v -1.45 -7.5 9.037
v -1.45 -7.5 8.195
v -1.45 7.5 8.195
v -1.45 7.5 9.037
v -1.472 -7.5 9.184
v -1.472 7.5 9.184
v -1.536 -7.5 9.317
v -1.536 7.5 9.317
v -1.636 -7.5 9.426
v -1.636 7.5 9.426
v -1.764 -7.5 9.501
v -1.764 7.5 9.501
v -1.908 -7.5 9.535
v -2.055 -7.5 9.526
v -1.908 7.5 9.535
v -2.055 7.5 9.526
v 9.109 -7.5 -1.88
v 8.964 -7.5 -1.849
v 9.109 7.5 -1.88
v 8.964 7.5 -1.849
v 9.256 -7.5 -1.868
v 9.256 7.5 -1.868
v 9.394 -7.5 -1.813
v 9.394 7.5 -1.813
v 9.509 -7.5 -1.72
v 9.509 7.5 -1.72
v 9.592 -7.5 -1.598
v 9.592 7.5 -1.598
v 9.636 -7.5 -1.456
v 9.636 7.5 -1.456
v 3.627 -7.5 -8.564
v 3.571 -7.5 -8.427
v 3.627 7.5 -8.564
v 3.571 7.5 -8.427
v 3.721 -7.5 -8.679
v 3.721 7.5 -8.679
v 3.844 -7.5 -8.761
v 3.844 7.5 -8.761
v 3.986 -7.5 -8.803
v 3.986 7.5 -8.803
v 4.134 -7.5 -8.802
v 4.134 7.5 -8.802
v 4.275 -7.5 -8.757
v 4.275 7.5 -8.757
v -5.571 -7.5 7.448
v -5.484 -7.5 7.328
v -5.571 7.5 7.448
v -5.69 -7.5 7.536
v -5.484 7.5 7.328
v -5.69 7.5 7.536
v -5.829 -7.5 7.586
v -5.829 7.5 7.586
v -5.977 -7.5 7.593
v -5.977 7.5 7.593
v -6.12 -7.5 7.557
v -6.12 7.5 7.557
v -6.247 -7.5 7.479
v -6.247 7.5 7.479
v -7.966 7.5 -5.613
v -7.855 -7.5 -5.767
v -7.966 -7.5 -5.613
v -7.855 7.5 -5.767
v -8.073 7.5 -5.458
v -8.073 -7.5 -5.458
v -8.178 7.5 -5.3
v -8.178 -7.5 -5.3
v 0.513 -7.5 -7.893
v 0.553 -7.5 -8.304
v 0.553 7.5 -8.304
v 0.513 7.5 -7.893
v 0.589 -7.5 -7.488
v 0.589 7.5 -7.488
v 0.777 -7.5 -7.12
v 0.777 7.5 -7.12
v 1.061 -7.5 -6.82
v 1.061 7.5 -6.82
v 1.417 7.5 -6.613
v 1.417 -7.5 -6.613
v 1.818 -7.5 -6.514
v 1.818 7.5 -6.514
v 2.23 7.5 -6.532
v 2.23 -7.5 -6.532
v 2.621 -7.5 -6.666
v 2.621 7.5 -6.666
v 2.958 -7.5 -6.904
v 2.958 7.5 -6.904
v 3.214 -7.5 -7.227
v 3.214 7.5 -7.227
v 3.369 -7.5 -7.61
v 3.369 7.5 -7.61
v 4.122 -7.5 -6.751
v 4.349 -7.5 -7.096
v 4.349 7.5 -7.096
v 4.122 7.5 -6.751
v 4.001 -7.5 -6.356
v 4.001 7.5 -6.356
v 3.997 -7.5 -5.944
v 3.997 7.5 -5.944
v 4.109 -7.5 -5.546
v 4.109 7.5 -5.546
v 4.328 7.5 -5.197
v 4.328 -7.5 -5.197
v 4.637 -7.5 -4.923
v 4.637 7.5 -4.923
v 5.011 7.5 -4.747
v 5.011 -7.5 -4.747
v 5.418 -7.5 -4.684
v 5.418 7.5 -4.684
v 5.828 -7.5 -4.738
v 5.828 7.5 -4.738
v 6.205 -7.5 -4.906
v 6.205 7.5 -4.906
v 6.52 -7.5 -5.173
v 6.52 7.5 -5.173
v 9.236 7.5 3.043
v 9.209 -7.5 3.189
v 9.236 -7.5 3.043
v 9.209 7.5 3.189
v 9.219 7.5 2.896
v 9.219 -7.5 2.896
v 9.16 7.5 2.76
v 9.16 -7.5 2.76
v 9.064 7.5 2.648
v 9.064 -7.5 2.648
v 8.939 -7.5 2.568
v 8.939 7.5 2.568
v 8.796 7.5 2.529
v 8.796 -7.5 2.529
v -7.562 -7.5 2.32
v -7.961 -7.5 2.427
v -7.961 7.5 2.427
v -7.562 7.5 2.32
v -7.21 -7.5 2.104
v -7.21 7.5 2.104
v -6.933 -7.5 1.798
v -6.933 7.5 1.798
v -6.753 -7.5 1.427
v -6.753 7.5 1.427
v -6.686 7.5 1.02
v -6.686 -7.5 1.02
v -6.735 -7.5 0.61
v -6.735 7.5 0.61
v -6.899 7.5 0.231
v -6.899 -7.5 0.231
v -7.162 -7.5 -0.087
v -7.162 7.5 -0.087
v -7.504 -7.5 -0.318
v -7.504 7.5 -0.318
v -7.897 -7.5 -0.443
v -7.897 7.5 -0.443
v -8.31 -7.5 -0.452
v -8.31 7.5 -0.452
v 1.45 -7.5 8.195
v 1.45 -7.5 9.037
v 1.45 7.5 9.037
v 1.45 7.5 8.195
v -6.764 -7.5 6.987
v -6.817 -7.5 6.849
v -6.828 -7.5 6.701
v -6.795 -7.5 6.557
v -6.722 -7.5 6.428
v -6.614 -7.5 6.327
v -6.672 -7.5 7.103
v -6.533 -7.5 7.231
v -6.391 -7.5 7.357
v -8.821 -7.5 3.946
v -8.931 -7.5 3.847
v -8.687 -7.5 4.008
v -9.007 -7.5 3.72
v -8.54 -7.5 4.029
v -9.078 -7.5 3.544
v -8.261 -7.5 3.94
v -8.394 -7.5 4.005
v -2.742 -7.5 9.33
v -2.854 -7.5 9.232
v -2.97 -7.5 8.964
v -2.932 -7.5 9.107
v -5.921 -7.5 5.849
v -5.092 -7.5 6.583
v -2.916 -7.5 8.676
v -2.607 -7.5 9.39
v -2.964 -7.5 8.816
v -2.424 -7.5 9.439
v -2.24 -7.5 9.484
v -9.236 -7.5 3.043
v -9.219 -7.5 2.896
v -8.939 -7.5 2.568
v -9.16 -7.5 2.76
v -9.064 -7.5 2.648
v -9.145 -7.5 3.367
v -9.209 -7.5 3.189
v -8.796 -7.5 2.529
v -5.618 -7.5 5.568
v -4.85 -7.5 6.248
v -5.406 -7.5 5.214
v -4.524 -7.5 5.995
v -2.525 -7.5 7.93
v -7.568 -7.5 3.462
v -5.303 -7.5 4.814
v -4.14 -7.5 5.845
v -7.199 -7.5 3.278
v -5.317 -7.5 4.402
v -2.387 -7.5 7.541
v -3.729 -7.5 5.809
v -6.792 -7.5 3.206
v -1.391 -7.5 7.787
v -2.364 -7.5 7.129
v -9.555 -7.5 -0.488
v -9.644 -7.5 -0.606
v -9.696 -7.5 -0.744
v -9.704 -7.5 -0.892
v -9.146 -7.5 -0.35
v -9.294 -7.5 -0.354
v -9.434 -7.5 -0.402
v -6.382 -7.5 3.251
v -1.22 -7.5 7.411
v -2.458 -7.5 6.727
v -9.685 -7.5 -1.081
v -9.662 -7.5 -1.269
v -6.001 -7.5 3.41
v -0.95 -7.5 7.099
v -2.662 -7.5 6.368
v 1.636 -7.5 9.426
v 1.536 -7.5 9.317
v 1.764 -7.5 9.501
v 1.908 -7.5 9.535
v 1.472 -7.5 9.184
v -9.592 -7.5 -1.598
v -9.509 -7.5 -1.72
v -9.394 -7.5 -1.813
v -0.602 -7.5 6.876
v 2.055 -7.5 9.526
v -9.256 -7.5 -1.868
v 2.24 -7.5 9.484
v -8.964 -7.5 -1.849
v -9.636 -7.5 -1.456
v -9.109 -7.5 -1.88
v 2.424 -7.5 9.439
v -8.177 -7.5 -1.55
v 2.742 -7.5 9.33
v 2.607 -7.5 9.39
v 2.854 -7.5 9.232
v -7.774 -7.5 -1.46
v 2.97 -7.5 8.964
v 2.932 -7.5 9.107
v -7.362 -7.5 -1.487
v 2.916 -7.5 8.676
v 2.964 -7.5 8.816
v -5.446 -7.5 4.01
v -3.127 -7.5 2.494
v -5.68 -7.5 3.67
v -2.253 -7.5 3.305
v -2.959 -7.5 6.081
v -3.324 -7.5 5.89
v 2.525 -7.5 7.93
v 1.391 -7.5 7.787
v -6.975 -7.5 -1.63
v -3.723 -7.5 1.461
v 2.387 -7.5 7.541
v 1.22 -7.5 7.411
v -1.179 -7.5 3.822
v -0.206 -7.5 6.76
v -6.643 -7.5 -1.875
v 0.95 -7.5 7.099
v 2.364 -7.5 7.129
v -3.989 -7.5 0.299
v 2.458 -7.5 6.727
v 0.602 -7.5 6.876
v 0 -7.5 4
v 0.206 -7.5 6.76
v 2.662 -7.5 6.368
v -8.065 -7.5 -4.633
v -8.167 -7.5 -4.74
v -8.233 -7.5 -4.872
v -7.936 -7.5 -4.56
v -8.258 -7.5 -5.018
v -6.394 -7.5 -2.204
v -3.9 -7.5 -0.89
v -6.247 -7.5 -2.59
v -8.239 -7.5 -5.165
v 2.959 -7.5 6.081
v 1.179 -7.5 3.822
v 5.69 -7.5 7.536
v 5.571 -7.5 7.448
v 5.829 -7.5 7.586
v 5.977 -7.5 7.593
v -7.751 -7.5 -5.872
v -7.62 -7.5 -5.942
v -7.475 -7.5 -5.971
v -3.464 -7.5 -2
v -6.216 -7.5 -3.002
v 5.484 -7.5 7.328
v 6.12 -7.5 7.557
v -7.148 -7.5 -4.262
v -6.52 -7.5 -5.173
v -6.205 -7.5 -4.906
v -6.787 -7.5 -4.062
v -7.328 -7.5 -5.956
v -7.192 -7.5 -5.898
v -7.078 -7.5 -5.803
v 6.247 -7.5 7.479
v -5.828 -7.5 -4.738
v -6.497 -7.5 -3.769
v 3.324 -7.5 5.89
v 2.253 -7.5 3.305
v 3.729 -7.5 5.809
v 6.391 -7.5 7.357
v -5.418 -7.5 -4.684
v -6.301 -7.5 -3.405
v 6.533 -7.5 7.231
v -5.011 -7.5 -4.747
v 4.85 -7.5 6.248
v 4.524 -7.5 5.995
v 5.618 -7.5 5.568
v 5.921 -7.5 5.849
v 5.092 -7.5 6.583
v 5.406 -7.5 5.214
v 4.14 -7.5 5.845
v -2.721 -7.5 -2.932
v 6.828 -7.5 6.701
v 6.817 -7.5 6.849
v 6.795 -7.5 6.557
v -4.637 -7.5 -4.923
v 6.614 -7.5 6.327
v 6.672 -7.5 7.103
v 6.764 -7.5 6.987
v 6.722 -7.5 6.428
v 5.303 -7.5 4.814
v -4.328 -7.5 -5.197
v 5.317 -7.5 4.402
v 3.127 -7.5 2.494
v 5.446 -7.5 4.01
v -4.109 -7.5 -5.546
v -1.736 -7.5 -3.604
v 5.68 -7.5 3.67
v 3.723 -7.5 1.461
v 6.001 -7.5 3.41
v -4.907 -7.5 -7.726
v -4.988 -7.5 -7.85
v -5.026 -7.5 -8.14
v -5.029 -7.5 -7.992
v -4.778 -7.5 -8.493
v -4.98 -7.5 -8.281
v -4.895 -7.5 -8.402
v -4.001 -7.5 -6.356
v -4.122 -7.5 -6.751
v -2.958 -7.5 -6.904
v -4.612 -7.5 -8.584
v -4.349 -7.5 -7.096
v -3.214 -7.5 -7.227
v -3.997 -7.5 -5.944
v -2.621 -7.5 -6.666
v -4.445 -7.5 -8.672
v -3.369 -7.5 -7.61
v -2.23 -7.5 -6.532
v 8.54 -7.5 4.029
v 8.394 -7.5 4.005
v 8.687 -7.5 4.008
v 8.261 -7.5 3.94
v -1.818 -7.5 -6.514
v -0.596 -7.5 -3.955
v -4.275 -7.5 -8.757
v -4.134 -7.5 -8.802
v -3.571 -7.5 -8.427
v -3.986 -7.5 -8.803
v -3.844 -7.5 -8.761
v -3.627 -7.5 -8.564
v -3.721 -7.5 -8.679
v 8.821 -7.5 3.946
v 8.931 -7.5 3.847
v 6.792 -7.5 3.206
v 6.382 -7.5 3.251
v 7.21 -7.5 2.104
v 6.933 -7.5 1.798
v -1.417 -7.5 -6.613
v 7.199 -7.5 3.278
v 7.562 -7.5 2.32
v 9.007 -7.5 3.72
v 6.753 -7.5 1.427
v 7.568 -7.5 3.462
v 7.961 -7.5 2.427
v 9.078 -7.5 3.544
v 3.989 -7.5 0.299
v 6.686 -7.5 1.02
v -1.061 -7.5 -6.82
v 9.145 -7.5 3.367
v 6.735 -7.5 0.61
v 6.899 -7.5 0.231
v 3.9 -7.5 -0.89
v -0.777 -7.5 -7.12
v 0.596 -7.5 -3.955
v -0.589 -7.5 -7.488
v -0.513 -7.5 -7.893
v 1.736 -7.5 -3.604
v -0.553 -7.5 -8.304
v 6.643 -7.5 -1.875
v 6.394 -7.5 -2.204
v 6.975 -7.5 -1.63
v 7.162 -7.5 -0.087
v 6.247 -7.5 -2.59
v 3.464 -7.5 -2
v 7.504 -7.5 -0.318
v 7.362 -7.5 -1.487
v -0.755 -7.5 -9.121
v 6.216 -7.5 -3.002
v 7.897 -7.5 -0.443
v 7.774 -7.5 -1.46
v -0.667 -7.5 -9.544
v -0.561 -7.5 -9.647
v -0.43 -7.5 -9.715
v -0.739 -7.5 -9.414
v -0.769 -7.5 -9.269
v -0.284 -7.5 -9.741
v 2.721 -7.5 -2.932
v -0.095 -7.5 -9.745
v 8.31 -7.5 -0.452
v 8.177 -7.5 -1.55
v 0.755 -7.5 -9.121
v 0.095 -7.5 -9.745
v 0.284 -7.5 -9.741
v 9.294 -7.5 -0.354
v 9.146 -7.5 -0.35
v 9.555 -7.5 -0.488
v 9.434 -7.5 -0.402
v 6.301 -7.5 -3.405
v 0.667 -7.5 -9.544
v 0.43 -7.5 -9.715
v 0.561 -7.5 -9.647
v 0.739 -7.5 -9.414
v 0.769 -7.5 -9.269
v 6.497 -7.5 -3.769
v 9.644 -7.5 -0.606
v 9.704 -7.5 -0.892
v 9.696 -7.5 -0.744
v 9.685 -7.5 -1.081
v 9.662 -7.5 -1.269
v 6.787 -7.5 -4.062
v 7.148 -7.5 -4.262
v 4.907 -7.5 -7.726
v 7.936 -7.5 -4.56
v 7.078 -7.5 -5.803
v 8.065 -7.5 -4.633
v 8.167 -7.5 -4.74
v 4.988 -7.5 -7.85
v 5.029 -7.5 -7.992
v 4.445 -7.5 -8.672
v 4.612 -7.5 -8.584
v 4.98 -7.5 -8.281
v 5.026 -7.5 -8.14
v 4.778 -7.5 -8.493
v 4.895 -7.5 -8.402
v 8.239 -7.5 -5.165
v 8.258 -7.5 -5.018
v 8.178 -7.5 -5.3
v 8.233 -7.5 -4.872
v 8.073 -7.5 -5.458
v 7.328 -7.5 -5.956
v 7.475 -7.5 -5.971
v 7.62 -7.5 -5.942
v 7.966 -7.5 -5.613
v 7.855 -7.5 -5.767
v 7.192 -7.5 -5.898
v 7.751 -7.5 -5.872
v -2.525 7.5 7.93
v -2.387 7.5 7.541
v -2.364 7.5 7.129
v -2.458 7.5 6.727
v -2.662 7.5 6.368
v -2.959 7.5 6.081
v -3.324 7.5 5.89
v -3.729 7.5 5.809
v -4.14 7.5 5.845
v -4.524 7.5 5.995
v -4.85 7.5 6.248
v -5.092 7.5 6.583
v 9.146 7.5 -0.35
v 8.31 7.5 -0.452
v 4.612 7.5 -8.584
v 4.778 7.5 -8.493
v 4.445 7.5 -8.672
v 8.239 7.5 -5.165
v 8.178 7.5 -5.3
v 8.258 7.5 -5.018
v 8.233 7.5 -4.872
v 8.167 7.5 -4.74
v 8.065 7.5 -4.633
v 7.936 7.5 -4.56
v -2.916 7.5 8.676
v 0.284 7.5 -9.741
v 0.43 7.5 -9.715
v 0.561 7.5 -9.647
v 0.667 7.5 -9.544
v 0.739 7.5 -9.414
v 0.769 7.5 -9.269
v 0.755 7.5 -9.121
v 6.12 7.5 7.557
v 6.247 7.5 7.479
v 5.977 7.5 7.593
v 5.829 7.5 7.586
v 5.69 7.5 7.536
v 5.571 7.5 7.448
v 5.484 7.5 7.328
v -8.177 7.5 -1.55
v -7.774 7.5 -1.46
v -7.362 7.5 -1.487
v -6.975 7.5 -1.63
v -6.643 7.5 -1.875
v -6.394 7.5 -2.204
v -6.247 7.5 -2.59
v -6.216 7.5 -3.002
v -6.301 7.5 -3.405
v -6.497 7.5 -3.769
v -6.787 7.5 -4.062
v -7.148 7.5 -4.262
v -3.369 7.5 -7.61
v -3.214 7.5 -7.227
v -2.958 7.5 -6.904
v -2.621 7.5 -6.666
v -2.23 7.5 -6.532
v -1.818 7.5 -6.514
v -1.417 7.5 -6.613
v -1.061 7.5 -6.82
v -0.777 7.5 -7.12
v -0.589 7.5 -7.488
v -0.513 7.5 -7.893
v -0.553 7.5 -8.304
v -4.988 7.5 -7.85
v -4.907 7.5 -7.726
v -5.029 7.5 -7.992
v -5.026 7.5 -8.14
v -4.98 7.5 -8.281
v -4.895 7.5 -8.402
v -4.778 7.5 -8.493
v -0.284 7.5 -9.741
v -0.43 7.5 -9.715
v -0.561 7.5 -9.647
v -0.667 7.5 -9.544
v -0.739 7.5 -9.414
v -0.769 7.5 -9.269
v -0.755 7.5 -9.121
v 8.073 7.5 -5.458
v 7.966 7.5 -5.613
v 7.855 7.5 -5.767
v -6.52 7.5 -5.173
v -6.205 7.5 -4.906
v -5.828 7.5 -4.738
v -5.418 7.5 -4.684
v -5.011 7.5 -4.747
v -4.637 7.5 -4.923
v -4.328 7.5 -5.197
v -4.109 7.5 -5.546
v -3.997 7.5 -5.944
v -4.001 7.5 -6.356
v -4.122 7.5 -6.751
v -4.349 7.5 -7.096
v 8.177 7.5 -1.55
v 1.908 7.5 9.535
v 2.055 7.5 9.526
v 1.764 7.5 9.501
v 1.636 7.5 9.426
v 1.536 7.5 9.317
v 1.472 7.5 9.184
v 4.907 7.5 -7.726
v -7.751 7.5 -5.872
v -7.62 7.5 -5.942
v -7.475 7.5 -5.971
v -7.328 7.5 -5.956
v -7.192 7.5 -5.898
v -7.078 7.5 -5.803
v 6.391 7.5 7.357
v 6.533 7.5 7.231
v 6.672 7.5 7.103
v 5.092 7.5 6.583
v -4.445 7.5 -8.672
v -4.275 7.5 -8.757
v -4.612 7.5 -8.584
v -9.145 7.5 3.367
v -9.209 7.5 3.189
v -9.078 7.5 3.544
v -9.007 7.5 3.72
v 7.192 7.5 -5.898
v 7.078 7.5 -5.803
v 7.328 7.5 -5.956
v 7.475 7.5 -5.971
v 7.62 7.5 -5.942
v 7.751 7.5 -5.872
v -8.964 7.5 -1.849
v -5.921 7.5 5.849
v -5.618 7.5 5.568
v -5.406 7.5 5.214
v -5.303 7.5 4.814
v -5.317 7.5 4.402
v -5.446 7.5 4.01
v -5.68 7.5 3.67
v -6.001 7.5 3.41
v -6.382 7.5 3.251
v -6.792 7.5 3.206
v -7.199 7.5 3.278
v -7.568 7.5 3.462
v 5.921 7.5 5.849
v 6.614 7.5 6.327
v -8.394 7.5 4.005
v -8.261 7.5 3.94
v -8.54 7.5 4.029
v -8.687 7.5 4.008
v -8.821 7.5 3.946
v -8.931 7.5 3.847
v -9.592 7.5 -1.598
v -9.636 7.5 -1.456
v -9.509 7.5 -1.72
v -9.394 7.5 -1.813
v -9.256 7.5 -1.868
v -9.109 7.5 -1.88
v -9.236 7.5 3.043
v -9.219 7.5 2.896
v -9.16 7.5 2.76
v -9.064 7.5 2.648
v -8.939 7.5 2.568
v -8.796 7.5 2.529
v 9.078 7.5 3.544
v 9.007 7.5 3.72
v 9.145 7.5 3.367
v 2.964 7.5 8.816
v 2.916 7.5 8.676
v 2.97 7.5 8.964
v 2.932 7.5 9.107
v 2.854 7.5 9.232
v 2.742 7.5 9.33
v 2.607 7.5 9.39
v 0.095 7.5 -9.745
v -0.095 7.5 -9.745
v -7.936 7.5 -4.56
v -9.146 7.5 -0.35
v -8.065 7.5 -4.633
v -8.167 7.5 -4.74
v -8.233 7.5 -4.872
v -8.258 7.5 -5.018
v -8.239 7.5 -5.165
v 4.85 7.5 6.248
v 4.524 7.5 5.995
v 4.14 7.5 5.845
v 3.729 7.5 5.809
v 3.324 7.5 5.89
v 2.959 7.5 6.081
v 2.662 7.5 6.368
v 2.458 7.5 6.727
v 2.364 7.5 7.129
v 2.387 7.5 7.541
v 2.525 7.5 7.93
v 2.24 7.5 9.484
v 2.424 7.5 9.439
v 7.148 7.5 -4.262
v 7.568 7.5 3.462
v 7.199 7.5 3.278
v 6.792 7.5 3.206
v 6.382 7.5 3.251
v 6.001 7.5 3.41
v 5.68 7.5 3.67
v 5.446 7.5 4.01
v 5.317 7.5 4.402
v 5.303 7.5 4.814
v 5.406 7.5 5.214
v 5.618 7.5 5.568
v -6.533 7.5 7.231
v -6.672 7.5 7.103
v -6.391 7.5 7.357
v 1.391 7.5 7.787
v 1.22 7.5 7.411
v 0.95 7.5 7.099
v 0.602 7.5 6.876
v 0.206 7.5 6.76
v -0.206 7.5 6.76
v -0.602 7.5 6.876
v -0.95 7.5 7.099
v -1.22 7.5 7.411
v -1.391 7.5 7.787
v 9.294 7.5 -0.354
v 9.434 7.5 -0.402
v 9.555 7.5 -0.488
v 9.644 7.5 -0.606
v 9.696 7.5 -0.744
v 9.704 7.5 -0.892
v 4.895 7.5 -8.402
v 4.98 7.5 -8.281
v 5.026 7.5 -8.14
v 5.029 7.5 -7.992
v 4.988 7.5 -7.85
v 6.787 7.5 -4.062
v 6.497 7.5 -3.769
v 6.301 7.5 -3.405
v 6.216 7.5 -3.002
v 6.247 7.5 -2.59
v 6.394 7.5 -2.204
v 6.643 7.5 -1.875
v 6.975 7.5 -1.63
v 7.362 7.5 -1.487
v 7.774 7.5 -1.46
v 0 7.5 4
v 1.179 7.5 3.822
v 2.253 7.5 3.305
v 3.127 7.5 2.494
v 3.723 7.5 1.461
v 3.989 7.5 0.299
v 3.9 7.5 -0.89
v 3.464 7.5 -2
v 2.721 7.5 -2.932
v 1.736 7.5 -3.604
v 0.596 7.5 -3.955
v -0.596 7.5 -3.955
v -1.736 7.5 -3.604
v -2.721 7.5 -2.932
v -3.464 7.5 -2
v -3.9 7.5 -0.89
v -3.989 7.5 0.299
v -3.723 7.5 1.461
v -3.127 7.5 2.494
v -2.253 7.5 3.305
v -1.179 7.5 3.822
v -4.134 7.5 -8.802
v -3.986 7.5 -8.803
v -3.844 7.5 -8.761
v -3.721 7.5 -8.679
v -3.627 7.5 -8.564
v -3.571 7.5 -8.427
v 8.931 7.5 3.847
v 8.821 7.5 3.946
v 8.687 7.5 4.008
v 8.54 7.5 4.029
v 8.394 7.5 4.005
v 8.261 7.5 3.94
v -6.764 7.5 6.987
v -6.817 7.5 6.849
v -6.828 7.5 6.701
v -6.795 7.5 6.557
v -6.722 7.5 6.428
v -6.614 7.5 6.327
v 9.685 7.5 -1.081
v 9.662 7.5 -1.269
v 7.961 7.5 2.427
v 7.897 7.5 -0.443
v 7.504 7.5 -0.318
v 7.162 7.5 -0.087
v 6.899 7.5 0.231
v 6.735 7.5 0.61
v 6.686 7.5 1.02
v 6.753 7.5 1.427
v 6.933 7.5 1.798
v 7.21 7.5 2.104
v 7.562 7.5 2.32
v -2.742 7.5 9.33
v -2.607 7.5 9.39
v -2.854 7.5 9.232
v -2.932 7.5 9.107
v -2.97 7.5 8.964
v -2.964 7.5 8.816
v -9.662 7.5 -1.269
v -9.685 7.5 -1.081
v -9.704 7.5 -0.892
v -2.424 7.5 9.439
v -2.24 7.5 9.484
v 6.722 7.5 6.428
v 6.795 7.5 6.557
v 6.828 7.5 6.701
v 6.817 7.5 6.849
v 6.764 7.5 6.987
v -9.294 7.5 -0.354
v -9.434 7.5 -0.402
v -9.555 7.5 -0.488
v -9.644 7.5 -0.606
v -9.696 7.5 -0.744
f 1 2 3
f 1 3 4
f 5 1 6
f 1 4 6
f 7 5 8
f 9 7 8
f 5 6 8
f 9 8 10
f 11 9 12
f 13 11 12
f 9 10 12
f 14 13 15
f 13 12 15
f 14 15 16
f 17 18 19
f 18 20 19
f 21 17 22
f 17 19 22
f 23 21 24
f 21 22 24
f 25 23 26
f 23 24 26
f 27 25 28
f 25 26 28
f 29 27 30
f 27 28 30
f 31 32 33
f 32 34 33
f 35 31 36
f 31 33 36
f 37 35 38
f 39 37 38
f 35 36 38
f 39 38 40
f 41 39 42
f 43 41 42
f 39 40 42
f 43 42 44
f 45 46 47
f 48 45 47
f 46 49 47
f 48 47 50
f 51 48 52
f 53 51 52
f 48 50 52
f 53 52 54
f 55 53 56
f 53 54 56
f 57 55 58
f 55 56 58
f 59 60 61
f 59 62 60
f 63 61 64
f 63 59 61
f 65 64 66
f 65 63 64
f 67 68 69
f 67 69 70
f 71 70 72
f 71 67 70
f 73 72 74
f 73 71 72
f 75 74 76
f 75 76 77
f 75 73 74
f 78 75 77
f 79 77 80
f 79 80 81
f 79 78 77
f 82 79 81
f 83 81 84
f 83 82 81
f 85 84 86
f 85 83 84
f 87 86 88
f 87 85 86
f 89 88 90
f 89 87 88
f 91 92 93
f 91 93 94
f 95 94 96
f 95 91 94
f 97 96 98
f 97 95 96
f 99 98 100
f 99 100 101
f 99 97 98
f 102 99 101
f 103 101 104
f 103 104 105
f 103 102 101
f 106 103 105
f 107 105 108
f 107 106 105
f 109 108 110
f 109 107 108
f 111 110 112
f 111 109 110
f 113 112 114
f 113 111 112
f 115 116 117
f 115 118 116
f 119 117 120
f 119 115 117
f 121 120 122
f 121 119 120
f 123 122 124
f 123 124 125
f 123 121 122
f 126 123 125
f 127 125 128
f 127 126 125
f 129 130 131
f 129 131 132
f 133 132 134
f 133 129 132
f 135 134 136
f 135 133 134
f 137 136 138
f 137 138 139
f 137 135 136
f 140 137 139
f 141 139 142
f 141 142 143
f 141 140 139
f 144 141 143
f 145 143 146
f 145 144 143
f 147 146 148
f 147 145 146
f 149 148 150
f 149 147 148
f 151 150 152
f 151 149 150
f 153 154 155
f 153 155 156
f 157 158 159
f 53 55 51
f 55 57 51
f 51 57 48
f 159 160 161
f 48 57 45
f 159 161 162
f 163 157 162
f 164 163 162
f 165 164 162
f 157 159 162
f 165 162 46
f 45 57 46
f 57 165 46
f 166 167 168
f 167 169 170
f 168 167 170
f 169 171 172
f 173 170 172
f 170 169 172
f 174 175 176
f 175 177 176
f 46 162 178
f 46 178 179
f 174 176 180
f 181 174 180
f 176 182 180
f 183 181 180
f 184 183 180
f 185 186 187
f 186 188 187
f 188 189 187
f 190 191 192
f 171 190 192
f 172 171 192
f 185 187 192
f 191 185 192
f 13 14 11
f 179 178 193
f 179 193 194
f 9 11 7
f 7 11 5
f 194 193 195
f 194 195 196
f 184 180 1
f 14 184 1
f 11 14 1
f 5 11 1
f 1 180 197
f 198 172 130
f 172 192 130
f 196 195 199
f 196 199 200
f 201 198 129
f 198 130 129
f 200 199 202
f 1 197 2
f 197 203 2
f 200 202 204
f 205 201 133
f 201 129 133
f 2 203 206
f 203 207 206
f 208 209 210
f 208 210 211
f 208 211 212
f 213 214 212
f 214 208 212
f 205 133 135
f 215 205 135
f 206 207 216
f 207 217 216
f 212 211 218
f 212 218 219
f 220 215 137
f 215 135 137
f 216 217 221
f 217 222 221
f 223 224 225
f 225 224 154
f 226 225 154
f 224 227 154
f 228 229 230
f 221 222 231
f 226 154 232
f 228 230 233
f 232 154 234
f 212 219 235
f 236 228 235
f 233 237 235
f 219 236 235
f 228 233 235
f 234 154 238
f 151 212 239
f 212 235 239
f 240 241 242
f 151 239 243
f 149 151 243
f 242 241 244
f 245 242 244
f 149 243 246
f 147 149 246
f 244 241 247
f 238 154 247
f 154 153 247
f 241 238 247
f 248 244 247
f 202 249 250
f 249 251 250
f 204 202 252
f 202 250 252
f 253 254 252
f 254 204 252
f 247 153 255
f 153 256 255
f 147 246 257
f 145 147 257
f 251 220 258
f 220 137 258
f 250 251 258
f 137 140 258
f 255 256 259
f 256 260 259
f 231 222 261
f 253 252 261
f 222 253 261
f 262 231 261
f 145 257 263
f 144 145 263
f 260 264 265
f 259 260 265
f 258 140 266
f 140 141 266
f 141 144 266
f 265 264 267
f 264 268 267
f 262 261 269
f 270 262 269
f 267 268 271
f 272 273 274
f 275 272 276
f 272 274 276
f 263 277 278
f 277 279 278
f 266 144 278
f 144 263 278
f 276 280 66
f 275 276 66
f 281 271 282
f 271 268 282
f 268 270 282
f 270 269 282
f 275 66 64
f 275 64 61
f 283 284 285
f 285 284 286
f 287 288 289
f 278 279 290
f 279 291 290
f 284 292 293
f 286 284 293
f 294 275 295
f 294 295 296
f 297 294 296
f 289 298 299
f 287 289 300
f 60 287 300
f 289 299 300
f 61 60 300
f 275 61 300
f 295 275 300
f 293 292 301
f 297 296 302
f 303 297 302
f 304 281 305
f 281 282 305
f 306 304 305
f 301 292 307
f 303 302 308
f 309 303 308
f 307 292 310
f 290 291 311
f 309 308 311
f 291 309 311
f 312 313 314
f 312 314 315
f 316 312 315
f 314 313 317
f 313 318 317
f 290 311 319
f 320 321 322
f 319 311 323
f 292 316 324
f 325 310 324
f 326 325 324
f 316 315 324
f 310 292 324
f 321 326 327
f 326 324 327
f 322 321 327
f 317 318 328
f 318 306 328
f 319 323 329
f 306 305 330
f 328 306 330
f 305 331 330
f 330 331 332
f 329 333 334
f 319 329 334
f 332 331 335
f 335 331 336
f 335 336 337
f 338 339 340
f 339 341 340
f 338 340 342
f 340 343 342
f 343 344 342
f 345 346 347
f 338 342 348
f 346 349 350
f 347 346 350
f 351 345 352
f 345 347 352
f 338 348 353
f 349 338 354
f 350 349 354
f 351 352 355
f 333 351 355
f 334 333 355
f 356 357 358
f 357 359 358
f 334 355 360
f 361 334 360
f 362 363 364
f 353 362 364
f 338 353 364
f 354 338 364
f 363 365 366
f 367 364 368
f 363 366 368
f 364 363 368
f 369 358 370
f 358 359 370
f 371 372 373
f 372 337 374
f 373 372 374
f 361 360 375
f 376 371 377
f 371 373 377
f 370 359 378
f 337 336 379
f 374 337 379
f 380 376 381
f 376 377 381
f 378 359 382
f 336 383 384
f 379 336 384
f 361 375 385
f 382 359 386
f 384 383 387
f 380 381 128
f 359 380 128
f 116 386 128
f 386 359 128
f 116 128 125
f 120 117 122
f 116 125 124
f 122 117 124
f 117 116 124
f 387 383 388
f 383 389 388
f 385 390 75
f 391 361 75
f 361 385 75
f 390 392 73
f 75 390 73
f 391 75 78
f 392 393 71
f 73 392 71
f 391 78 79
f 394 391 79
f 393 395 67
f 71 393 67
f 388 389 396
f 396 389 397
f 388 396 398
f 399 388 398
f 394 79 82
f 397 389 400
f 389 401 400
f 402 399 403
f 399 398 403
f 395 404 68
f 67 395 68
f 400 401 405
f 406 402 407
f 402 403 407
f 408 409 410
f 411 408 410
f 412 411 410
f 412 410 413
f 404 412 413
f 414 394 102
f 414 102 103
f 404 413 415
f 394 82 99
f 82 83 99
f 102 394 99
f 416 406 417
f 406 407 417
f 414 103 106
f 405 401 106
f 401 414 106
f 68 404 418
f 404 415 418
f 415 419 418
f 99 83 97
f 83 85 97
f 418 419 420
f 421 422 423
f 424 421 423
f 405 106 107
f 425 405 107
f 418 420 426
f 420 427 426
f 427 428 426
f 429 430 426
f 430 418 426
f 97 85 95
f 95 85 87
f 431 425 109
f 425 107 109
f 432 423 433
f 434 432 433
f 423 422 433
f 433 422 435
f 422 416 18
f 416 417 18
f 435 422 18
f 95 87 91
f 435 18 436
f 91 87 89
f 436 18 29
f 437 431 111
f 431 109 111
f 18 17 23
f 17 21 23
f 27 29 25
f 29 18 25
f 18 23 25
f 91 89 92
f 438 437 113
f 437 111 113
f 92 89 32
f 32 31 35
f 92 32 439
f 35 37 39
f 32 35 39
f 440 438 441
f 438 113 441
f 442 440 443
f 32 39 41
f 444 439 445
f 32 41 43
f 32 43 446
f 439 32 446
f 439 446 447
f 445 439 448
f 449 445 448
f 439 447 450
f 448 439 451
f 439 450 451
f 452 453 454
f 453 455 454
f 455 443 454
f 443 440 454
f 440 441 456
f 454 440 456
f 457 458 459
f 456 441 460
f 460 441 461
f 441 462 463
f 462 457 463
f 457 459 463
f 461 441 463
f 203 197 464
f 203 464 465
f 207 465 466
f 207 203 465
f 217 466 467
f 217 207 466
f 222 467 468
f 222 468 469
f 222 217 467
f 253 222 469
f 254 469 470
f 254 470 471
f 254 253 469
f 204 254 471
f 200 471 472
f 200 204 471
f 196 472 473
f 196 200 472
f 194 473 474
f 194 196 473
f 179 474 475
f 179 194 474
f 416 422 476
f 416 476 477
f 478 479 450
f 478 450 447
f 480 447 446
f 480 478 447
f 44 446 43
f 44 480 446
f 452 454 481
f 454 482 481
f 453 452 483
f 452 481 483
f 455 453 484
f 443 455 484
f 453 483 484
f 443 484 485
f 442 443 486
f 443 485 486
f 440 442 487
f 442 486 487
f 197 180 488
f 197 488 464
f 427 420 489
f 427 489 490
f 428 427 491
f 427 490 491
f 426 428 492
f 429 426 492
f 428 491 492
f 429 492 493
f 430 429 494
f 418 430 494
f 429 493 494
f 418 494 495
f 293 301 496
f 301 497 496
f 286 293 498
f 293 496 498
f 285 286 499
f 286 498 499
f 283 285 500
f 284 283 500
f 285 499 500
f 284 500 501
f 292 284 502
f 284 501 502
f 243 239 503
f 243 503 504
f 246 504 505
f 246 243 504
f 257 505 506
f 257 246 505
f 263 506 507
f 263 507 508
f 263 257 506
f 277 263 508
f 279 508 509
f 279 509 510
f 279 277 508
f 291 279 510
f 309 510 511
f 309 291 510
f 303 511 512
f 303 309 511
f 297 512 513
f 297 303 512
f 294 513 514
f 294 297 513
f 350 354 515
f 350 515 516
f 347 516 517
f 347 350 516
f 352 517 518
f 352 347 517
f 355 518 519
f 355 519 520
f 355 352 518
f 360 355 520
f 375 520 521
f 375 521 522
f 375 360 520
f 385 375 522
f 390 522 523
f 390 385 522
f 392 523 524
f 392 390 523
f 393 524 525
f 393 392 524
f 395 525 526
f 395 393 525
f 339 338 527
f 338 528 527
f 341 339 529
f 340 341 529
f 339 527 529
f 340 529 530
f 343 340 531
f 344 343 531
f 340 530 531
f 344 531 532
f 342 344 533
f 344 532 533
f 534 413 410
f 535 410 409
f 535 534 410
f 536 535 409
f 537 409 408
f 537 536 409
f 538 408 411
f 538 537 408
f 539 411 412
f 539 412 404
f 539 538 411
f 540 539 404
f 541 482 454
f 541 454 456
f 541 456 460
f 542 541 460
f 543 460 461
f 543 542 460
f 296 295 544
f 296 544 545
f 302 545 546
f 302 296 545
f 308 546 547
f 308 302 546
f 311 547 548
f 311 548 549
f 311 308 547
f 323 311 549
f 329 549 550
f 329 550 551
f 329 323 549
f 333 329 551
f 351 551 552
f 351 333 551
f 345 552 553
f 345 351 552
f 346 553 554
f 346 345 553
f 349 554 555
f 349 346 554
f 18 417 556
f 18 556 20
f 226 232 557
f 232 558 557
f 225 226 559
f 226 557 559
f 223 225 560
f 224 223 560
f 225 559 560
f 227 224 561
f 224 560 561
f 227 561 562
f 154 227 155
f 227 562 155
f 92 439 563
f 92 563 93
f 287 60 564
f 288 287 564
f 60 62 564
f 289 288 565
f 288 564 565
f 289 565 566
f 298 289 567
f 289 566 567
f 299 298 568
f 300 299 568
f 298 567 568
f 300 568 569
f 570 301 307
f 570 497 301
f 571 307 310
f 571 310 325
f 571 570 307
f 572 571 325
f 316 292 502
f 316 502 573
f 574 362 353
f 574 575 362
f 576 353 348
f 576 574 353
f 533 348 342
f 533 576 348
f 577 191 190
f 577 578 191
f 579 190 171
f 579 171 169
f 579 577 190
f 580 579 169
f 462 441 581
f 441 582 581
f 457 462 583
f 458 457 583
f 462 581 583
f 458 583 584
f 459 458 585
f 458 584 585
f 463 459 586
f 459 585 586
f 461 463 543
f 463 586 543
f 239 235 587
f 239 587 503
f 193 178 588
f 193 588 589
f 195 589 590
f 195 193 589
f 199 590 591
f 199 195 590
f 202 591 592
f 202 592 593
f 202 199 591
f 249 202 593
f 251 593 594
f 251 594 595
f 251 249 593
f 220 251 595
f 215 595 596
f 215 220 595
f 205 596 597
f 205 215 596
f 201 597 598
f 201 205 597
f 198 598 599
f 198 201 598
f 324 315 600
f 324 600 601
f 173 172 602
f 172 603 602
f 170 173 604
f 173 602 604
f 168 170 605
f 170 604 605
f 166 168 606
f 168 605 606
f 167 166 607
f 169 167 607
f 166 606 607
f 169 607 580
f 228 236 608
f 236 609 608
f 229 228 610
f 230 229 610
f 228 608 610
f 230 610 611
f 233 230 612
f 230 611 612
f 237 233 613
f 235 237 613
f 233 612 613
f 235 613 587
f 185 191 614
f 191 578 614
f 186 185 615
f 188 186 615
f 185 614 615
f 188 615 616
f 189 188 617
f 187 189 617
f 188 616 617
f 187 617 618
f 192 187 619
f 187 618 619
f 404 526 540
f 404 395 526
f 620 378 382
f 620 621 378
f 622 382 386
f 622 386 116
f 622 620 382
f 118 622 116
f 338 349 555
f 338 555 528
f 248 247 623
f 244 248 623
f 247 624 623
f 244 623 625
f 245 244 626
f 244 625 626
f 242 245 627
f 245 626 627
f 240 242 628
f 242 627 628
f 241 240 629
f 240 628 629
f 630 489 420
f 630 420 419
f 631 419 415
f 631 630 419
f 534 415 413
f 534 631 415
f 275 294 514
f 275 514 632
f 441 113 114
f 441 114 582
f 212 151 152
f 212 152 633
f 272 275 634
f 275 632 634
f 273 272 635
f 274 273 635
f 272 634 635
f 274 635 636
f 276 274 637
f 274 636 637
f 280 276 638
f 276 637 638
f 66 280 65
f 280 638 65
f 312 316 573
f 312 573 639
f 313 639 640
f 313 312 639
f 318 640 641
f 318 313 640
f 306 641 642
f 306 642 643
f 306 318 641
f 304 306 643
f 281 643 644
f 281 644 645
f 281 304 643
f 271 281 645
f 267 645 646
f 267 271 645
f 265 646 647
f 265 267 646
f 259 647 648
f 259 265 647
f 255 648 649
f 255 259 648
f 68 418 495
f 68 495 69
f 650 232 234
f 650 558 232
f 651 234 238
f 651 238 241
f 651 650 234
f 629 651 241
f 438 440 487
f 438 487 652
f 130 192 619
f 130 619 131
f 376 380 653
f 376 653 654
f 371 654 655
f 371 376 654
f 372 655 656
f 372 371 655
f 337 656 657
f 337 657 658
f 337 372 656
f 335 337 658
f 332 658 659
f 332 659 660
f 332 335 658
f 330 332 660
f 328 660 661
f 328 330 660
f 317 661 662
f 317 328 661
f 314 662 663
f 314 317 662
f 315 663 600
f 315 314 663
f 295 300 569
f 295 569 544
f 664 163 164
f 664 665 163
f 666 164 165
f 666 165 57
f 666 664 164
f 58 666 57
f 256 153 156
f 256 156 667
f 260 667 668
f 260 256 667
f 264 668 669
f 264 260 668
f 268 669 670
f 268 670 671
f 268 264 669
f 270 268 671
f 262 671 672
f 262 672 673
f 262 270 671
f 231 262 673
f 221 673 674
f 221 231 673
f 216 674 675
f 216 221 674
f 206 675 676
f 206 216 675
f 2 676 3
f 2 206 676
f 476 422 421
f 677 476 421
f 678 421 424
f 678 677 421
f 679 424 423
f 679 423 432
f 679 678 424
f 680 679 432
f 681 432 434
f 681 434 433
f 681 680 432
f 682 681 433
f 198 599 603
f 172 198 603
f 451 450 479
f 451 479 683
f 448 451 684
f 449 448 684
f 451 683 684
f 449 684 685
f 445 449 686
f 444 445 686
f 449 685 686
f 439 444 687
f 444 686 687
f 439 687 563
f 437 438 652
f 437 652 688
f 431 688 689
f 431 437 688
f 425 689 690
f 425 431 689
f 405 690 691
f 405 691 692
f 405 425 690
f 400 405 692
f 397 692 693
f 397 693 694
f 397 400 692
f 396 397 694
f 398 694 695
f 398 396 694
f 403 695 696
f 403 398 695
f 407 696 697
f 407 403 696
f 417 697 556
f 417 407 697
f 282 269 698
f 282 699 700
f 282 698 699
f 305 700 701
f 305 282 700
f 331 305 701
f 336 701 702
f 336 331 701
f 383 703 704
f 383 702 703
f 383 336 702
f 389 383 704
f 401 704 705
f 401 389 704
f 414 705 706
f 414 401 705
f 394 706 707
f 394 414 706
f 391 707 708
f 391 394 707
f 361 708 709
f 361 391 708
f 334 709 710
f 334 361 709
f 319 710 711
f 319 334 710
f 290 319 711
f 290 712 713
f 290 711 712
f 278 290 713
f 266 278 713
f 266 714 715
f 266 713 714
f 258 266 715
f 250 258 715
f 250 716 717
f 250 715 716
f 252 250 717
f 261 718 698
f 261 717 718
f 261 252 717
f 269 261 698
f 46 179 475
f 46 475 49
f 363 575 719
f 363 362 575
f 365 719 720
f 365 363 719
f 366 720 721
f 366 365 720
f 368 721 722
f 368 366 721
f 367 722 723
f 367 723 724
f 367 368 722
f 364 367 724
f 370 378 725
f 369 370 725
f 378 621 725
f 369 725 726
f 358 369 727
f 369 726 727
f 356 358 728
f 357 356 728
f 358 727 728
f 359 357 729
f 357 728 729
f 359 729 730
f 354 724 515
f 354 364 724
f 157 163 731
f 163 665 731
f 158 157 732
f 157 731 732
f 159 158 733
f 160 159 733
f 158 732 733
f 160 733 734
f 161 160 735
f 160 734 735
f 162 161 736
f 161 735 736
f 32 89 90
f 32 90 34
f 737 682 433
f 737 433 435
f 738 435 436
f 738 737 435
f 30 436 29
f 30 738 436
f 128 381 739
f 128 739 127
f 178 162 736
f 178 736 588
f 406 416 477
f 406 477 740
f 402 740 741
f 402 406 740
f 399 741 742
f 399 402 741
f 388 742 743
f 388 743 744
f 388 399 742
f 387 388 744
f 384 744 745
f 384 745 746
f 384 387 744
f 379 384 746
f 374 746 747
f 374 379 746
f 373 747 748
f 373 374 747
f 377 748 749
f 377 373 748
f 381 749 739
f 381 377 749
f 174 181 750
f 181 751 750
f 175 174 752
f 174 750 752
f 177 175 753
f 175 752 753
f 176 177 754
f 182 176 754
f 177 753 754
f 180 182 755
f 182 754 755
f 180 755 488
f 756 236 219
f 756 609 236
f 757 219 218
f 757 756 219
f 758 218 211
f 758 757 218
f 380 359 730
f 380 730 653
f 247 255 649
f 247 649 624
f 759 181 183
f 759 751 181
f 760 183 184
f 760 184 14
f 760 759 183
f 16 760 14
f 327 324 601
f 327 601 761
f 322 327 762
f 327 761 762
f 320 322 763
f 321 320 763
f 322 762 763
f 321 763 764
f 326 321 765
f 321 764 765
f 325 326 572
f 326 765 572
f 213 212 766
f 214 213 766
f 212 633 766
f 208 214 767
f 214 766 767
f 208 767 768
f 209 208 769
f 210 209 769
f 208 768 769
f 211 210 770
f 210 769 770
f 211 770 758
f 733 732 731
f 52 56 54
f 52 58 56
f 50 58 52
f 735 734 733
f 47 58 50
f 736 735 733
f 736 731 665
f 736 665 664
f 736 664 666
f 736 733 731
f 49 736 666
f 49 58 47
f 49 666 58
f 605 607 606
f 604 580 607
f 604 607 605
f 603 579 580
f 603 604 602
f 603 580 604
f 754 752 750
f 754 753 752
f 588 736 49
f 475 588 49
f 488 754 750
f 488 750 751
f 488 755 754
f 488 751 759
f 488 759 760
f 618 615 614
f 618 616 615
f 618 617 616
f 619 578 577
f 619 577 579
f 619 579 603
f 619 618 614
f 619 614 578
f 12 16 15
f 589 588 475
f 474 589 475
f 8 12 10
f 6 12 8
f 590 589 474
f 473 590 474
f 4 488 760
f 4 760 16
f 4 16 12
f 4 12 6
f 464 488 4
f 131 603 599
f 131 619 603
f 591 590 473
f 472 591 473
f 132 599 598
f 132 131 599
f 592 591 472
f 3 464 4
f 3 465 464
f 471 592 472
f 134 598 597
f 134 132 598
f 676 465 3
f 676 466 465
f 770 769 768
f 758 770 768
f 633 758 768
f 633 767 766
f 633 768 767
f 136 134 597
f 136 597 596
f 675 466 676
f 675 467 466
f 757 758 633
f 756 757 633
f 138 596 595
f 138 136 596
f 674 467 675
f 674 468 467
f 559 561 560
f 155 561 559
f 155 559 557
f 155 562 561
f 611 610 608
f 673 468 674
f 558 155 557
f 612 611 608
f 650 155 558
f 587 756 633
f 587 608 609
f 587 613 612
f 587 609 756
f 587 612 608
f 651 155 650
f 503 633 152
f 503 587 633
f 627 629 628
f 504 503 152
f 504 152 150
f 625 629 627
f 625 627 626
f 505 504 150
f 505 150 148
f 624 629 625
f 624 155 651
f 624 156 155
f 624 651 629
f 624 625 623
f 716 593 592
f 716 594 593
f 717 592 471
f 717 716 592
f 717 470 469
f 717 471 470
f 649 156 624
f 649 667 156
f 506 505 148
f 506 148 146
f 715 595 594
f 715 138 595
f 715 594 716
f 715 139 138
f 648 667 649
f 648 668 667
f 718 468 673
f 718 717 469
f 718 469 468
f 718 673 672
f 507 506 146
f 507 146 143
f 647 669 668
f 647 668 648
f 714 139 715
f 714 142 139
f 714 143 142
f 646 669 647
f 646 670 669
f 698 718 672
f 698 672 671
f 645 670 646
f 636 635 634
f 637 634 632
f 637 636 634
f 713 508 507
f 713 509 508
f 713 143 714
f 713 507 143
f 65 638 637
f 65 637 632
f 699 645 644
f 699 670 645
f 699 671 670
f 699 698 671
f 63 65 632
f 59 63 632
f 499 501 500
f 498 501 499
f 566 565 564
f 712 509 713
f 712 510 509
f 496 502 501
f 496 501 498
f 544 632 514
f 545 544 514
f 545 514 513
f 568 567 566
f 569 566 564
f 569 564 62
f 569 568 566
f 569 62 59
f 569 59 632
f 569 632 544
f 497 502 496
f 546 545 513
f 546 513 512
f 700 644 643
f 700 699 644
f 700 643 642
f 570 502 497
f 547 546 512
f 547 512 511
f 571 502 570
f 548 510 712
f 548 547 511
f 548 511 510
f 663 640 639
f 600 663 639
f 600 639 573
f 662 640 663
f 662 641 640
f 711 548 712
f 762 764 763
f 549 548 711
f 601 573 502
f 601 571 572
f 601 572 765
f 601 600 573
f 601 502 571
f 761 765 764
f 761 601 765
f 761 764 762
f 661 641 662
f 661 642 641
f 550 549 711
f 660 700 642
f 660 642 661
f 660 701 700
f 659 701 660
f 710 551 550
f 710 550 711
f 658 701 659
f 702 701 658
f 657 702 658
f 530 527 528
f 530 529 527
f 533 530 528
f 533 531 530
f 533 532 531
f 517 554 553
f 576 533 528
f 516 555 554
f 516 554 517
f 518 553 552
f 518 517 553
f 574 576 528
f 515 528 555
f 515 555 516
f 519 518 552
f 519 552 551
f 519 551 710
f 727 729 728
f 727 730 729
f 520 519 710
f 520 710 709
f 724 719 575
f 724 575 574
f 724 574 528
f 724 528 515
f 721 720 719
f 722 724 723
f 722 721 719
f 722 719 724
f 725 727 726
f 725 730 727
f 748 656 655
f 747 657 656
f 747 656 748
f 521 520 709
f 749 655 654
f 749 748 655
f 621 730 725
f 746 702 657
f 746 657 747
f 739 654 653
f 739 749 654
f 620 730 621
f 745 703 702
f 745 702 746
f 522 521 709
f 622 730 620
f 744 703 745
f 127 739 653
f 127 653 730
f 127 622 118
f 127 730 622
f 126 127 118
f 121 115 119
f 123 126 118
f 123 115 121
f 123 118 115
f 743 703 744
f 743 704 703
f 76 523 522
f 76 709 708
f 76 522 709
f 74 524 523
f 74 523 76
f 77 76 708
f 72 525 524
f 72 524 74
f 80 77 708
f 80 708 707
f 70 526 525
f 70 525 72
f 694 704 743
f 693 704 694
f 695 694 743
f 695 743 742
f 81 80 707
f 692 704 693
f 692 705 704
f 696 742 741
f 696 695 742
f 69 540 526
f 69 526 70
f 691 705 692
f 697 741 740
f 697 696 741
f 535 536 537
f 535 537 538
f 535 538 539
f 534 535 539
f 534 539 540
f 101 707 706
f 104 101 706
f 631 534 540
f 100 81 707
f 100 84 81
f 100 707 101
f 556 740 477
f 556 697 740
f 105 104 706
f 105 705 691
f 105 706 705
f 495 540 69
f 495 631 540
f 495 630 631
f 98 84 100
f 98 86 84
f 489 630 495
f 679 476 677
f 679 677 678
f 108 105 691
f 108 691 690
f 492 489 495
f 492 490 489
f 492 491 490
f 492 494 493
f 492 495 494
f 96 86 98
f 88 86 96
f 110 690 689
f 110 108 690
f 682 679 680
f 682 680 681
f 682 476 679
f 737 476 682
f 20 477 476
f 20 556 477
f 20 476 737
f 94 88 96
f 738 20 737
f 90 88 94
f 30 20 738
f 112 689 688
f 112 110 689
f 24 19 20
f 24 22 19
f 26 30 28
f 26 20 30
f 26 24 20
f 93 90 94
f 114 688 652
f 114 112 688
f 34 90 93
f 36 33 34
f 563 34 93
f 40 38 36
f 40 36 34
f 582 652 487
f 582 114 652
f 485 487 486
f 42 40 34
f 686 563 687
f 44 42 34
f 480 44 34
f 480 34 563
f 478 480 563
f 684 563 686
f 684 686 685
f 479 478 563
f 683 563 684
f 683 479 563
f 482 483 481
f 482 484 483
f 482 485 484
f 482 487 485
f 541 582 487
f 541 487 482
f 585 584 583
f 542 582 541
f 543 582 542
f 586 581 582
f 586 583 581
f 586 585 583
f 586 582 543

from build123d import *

# Parameters (mm, degrees)
BOSS_EXTRUDE1_DEPTH      = 7.5
CUT_EXTRUDE1_START       = -7.5
CUT_EXTRUDE1_DEPTH       = 15
FILLET1_R                = 0.5
CIRPATTERN1_COUNT        = 13
FILLET1_OF_CIRPATTERN1_R = 0.5
CUT_EXTRUDE2_DEPTH       = 16.666124697
CUT_EXTRUDE2_DEPTH_BACK  = 16.666124697
SKETCH7_R                = 4


# Read off the part's stored shape, not the designer's step: Cut-Extrude1
with BuildPart() as part:
    # Sketch5 → Boss-Extrude1 (new, symmetric)
    with BuildSketch(Plane(origin=(0, 0, 0), x_dir=(1, 0, 0), z_dir=(0, 1, 0))):
        with BuildLine():
            ThreePointArc((-0.898321896, 9.703578331), (-2.332148212, 9.46189724), (-3.714053167, 9.009562905))
            Line((-3.714053167, 9.009562905), (-3.369074568, 7.60992971))
            ThreePointArc((-3.369074568, 7.60992971), (-1.614201219, 6.549071788), (-0.553343297, 8.303945136))
            Line((-0.553343297, 8.303945136), (-0.898321896, 9.703578331))
        make_face()
        with BuildLine():
            Line((-3.369074568, 7.60992971), (-3.714053167, 9.009562905))
            ThreePointArc((-3.714053167, 9.009562905), (-5.420917899, -8.098151875), (9.745071301, 0))
            ThreePointArc((9.745071301, 0), (6.565523731, 7.201410473), (-0.898321896, 9.703578331))
            Line((-0.898321896, 9.703578331), (-0.553343297, 8.303945136))
            ThreePointArc((-0.553343297, 8.303945136), (-1.614201219, 6.549071788), (-3.369074568, 7.60992971))
        make_face()
    extrude(amount=BOSS_EXTRUDE1_DEPTH, both=True)

    # Cut-Extrude1 outline → Cut-Extrude1 (cut)
    with BuildSketch(Plane(origin=(0, 0, 0), x_dir=(1, 0, 0), z_dir=(0, 1, 0)).offset(CUT_EXTRUDE1_START)):
        with BuildLine():
            ThreePointArc((-0.898321896, 9.703578331), (-2.332148212, 9.46189724), (-3.714053167, 9.009562905))
            Line((-3.714053167, 9.009562905), (-3.369074568, 7.60992971))
            ThreePointArc((-3.369074568, 7.60992971), (-1.61420122, 6.549071788), (-0.553343297, 8.303945136))
            Line((-0.553343297, 8.303945136), (-0.898321896, 9.703578331))
        make_face()
    cut_extrude1 = extrude(amount=CUT_EXTRUDE1_DEPTH, mode=Mode.SUBTRACT)

    # Fillet1
    fillet1_edges = [part.edges().sort_by_distance(p)[0] for p in [
        (-3.714053167, 0, -9.009562905),
        (-0.898321896, 0, -9.703578331),
    ]]
    fillet(fillet1_edges, radius=FILLET1_R)

    # CirPattern1: Cut-Extrude1 ×13 about axis
    cirpattern1_axis = Axis((0, 0, 0), (0, 1, 0))
    for i in range(1, CIRPATTERN1_COUNT):
        add(cut_extrude1.rotate(cirpattern1_axis, i * 360 / CIRPATTERN1_COUNT), mode=Mode.SUBTRACT)

    # Fillet1 of CirPattern1
    fillet1_of_cirpattern1_edges = [part.edges().sort_by_distance(p)[0] for p in [
        (-7.475583408, 0, -6.251565194),
        (-5.304902238, 0, -8.174620903),
        (-9.524547581, 0, -2.061409236),
        (-8.496193408, 0, -4.77295634),
        (-9.391552687, 0, 2.600990735),
        (-9.741109059, 0, -0.277865001),
        (-7.107066252, 0, 6.667535074),
        (-8.754454018, 0, 4.280881862),
        (-3.194436588, 0, 9.20662748),
        (-5.762259063, 0, 7.85893028),
        (1.45, 0, 9.636592482),
        (-1.45, 0, 9.636592482),
        (5.762259064, 0, 7.85893028),
        (3.194436589, 0, 9.206627479),
        (8.754454018, 0, 4.280881862),
        (7.107066252, 0, 6.667535073),
        (9.741109059, 0, -0.277865001),
        (9.391552686, 0, 2.600990734),
        (8.496193408, 0, -4.772956341),
        (9.524547581, 0, -2.061409237),
        (5.304902238, 0, -8.174620903),
        (7.475583408, 0, -6.251565194),
        (0.898321896, 0, -9.703578332),
        (3.714053167, 0, -9.009562905),
    ]]
    fillet(fillet1_of_cirpattern1_edges, radius=FILLET1_OF_CIRPATTERN1_R)

    # Sketch7 → Cut-Extrude2 (cut, two sides: drawn at the far end of the back side and taken through both)
    with BuildSketch(Plane(origin=(0, 0, 0), x_dir=(1, 0, 0), z_dir=(0, 1, 0)).offset(-CUT_EXTRUDE2_DEPTH_BACK)):
        with Locations(Location((0, 0, 0), (0, 0, 270))):
            Circle(SKETCH7_R)
    extrude(amount=CUT_EXTRUDE2_DEPTH + CUT_EXTRUDE2_DEPTH_BACK, mode=Mode.SUBTRACT)


solid = part.part
